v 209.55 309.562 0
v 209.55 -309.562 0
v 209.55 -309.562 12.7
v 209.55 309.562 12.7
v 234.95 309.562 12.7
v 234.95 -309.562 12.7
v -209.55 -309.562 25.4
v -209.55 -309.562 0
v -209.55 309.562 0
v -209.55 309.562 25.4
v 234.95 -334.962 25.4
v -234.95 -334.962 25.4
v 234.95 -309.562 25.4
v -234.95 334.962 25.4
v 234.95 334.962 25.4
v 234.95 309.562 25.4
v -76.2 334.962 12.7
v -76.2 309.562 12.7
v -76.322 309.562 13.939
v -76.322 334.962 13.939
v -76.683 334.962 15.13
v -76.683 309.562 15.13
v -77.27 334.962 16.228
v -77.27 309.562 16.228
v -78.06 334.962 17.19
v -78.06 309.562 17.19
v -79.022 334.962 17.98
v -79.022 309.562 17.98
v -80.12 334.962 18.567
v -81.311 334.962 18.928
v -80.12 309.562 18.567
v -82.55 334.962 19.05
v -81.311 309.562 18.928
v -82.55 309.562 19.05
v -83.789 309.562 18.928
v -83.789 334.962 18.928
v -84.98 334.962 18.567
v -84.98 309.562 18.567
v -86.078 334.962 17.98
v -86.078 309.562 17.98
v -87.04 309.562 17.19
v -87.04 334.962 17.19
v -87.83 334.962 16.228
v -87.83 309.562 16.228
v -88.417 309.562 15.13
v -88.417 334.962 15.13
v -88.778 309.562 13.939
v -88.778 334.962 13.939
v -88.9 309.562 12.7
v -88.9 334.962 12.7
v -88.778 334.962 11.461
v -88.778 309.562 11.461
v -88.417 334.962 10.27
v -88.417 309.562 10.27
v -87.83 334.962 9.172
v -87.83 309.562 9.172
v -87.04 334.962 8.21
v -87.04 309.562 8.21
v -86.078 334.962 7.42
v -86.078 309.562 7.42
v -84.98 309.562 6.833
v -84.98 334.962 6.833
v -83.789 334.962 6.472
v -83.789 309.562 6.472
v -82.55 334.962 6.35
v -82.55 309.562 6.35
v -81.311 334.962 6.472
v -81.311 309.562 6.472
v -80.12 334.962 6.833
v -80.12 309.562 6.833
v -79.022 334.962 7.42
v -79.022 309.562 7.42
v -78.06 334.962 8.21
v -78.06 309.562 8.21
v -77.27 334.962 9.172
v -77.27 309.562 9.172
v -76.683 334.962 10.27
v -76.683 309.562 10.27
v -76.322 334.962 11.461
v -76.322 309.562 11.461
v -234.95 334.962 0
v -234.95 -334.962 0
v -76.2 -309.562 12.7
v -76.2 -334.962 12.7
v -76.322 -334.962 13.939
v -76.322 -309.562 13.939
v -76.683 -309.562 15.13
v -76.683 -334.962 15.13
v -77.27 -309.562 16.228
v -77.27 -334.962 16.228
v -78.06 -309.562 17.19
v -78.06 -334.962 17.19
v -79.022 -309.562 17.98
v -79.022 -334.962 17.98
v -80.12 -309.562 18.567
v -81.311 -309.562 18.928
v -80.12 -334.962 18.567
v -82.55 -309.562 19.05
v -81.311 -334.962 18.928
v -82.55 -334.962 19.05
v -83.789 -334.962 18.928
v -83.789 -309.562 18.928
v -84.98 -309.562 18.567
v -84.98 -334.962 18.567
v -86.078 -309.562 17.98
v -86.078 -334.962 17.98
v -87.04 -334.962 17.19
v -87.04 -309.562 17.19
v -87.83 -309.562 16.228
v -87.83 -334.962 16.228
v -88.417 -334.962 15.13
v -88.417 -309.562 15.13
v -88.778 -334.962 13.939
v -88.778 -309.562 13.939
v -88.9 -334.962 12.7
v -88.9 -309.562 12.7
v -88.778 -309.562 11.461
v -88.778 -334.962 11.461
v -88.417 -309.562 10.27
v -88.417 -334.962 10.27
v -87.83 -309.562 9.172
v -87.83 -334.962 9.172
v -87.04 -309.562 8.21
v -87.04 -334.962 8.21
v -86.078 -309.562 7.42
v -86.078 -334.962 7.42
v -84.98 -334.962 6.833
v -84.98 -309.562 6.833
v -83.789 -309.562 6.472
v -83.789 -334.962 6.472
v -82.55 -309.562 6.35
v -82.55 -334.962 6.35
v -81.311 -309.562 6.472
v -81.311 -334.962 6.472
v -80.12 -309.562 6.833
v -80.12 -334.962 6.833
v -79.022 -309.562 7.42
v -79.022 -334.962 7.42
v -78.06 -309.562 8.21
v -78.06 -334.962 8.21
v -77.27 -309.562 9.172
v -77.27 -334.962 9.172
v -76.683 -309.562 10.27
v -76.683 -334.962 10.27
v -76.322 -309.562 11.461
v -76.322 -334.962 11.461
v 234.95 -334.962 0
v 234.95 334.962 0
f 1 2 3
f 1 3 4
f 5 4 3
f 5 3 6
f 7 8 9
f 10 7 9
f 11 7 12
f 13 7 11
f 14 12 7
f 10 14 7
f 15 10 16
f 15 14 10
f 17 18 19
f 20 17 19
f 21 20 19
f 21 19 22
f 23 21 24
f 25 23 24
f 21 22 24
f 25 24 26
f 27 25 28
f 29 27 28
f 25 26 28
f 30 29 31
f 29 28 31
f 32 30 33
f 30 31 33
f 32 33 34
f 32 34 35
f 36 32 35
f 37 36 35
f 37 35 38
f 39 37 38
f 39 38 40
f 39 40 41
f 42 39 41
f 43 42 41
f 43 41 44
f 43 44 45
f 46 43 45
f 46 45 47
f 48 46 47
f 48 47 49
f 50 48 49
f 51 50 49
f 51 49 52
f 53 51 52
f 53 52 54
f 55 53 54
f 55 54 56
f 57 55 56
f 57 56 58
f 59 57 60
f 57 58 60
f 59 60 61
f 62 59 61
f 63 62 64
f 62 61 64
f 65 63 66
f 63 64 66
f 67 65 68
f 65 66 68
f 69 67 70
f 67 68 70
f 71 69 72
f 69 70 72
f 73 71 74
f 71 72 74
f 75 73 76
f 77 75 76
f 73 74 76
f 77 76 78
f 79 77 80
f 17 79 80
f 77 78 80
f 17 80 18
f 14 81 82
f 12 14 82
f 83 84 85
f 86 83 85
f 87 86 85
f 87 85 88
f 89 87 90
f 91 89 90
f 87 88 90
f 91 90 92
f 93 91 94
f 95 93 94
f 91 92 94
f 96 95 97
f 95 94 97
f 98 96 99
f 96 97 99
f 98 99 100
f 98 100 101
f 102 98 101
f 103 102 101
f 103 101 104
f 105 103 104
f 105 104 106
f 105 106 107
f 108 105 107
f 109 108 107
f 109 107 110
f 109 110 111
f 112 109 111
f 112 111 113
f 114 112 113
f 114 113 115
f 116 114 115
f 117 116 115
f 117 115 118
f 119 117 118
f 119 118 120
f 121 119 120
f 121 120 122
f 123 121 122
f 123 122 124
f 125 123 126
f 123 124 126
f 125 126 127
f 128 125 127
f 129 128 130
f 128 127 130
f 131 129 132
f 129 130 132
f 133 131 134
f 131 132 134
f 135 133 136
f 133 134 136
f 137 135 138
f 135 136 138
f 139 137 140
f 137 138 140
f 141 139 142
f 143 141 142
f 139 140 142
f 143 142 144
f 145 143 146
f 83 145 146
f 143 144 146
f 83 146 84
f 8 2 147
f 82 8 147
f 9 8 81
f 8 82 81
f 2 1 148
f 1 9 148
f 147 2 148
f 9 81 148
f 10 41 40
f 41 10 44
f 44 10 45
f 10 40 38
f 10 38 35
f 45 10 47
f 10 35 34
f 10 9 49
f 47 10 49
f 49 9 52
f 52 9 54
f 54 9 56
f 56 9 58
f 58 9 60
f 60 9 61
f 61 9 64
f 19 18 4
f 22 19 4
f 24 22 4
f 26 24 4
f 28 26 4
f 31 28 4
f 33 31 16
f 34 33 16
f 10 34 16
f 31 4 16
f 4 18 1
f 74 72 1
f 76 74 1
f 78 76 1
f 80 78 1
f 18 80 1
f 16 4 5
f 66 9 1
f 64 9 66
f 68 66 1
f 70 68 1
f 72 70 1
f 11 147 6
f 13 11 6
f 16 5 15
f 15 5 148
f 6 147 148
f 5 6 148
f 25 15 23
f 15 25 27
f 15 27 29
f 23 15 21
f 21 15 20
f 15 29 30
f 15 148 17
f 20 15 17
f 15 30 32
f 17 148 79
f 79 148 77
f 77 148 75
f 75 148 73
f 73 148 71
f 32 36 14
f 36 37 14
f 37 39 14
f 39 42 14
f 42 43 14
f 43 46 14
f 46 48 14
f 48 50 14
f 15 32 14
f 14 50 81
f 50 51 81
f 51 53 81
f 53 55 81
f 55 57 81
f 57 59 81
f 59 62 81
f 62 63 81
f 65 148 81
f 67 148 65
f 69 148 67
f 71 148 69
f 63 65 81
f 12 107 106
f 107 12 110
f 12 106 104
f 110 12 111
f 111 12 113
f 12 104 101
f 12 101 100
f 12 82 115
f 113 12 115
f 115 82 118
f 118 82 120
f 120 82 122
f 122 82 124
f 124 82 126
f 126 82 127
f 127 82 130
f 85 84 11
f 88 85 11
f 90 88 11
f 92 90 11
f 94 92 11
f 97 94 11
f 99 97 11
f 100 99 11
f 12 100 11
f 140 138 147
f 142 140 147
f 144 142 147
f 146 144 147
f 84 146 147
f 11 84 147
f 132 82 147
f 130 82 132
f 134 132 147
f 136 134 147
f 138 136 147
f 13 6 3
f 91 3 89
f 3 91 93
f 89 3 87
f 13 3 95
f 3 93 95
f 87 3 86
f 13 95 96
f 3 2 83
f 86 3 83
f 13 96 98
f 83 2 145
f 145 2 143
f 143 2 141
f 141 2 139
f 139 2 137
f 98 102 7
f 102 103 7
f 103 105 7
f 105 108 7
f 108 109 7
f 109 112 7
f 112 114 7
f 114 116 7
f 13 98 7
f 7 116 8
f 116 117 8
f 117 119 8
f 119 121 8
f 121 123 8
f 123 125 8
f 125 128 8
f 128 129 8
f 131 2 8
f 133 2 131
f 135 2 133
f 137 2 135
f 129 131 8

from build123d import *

# Parameters (mm, degrees)
F1_DEPTH = 25.4
F0_W     = 25.4
F0_H     = 619.125
F2_DEPTH = 12.7
F3_R     = 6.35
F4_DEPTH = 762


with BuildPart() as f1:
    # F0 (on Top) → F1 (new body)
    with BuildSketch(Plane.XY):
        Polygon((234.95, 334.9625), (-234.95, 334.9625), (-234.95, -334.9625), (234.95, -334.9625), (234.95, -309.5625), (209.55, -309.5625), (-209.55, -309.5625), (-209.55, 309.5625), (209.55, 309.5625), (234.95, 309.5625), align=None)
    extrude(amount=F1_DEPTH)

    # F0 (on Top) → F2 (join)
    with BuildSketch(Plane.XY):
        with Locations((222.25, 0)):
            Rectangle(F0_W, F0_H)
    extrude(amount=F2_DEPTH)

    # F3 (on face) → F4 (cut)
    with BuildSketch(Plane.XZ.offset(334.9625)):
        with Locations((-82.55, 12.7)):
            Circle(F3_R)
    extrude(amount=-F4_DEPTH, mode=Mode.SUBTRACT)


solid = f1.part
